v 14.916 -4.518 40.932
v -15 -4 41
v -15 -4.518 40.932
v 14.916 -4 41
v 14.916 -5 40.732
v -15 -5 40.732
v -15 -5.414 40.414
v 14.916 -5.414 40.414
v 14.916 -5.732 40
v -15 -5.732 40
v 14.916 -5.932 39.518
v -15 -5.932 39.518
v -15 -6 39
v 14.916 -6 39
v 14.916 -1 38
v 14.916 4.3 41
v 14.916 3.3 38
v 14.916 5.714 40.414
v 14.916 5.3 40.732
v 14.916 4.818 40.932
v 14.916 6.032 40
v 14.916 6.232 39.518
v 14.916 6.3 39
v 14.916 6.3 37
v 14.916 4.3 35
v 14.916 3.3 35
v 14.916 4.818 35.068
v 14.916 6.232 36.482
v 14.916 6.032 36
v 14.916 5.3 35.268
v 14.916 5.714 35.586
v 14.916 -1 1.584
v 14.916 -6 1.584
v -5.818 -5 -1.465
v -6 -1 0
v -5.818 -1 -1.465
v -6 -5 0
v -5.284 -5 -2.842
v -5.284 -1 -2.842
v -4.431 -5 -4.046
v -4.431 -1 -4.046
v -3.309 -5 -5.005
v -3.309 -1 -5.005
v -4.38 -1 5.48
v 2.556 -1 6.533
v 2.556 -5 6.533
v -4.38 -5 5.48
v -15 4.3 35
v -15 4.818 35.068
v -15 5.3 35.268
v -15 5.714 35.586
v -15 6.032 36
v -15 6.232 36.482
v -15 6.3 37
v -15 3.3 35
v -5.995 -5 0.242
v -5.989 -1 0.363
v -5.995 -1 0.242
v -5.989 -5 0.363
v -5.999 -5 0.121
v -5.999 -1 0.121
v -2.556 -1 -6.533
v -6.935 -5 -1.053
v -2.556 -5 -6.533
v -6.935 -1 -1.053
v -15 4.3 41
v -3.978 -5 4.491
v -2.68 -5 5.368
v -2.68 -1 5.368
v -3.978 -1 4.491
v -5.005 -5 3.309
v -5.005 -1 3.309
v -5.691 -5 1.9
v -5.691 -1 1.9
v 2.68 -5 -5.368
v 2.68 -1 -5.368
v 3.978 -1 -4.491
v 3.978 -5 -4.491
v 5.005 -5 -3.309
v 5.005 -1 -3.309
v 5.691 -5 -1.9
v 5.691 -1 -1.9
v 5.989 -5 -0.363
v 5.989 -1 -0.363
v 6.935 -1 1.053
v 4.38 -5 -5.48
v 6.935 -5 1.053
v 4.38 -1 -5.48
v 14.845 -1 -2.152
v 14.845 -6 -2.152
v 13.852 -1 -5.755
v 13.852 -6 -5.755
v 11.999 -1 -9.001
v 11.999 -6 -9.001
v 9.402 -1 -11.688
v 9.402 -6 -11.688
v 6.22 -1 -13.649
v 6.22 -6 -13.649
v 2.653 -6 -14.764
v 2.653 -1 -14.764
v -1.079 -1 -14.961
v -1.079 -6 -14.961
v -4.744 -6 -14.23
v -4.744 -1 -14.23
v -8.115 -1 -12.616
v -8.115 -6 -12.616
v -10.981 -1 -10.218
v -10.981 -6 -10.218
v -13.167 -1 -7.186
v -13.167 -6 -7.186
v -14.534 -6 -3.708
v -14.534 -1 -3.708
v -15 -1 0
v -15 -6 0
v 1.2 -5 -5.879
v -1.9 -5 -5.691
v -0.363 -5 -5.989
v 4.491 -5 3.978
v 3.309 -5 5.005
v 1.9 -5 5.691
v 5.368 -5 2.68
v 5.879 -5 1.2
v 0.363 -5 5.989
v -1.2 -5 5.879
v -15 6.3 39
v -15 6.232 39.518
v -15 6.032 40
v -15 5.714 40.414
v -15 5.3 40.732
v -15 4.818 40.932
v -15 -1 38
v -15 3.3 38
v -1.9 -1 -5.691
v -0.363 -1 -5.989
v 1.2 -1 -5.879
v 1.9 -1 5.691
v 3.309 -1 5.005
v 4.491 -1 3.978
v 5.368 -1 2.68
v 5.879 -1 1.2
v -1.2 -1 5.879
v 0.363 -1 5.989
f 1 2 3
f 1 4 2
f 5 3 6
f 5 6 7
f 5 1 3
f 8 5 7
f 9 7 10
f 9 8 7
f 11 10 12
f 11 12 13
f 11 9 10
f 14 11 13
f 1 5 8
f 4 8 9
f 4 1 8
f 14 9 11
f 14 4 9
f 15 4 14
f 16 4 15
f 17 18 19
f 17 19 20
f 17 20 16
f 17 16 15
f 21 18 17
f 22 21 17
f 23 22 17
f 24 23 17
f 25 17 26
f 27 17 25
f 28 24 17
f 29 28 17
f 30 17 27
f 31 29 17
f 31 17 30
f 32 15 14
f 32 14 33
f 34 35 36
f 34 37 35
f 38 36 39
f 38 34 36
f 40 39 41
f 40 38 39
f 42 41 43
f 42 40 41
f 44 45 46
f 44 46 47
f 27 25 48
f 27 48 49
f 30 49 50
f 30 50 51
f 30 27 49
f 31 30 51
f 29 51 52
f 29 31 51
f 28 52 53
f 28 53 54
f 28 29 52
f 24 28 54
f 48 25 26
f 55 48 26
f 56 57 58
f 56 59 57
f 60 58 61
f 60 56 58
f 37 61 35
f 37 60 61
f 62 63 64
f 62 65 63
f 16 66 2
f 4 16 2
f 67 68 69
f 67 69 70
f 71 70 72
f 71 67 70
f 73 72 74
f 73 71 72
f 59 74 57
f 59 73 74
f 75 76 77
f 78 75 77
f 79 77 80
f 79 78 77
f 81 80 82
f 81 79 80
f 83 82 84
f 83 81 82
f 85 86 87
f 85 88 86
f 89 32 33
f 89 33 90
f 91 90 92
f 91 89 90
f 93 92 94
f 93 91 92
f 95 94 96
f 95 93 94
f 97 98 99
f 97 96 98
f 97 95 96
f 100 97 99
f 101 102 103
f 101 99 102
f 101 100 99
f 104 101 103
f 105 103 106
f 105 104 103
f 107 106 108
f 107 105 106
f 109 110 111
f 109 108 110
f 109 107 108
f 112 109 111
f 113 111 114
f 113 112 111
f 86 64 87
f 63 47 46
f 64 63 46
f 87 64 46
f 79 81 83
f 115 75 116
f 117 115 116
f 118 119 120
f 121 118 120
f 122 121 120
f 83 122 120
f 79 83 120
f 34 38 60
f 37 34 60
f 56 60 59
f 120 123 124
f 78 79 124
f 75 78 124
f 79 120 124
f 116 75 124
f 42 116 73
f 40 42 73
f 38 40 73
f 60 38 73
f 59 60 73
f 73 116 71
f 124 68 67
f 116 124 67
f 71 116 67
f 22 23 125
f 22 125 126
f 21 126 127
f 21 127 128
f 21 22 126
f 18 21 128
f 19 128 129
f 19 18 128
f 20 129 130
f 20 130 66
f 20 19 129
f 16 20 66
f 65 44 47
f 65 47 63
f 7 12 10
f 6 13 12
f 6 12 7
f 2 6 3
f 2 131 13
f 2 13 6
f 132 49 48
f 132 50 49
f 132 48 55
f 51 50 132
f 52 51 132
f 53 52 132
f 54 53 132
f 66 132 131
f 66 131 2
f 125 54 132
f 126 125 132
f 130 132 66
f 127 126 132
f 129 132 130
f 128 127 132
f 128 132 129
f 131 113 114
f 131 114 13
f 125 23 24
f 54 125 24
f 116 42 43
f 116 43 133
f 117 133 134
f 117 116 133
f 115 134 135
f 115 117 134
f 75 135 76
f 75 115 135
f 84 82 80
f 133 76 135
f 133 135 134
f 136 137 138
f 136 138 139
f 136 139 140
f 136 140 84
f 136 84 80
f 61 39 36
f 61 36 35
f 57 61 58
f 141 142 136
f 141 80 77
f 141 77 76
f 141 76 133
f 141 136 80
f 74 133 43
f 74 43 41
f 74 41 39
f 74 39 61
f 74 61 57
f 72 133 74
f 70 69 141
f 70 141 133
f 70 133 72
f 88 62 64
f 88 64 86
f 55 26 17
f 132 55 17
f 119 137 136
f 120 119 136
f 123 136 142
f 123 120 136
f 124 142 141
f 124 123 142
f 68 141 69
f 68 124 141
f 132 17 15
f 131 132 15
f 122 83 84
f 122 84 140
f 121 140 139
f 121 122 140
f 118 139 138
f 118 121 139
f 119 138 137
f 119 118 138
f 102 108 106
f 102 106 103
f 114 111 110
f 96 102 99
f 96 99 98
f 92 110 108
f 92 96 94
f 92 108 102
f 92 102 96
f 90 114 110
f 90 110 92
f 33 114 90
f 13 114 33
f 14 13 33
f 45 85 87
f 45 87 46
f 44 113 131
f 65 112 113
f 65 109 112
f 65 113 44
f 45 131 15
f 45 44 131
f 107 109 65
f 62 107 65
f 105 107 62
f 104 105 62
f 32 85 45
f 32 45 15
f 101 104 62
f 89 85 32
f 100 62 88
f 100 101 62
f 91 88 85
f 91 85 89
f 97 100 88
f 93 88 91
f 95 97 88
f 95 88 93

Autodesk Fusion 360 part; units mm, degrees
sketch "Boceto1" plane through (0, 0, 0) normal (0, 1, 0) x (1, 0, 0)
  circle A0 centre (0, 0) radius 11
  circle A1 centre (0, 0) radius 12
  circle A2 centre (0, 0) radius 15
  line L0 (0, 0) -> (0, -0.3305)
  dimension "d1" = 22
  dimension "d2" = 1
  dimension "d3" = 30
extrude "Extruir1" add sketch "Boceto1" against normal blind 1 contours A2 makes body 1
sketch "Boceto2" plane through (0, -1, 0) normal (0, -1, 0) x (1, 0, 0)
  circle A0 centre (0, 0) radius 12
  circle A1 centre (0, 0) radius 15
  circle A2 centre (0, 0) radius 6.075
  line L0 (-4.3795, 5.4797) -> (-6.9353, -1.0529)
  line L1 (-6.9353, -1.0529) -> (-2.5558, -6.5326)
  line L2 (-2.5558, -6.5326) -> (4.3795, -5.4797)
  line L3 (4.3795, -5.4797) -> (6.9353, 1.0529)
  line L4 (6.9353, 1.0529) -> (2.5558, 6.5326)
  line L5 (2.5558, 6.5326) -> (-4.3795, 5.4797)
  dimension "d6" = 12.15
extrude "Extruir2" add sketch "Boceto2" along normal blind 5 contours A0 | A1 bodies 1
sketch "Boceto3" plane through (0, -6, 0) normal (0, -1, 0) x (1, 0, 0)
  circle A0 centre (0, 0) radius 15
  line L0 (-4.3795, 5.4797) -> (2.5558, 6.5326)
  line L1 (2.5558, 6.5326) -> (6.9353, 1.0529)
  line L2 (6.9353, 1.0529) -> (4.3795, -5.4797)
  line L3 (4.3795, -5.4797) -> (-2.5558, -6.5326)
  line L4 (-2.5558, -6.5326) -> (-6.9353, -1.0529)
  line L5 (-6.9353, -1.0529) -> (-4.3795, 5.4797)
extrude "Extruir3" add sketch "Boceto3" against normal blind 1 contours L0 L1 L2 L3 L4 L5 bodies 1
sketch "Boceto4" plane through (0, -5, 0) normal (0, 1, 0) x (-1, 0, 0)
  circle A0 centre (0, 0) radius 6
  line L0 (-0.4187, 6.9155) -> (-6.1984, 3.0951)
  line L1 (-6.1984, 3.0951) -> (-5.7797, -3.8204)
  line L2 (-5.7797, -3.8204) -> (0.4187, -6.9155)
  line L3 (0.4187, -6.9155) -> (6.1984, -3.0951)
  line L4 (6.1984, -3.0951) -> (5.7797, 3.8204)
  line L5 (5.7797, 3.8204) -> (-0.4187, 6.9155)
  line L6 (2.5558, -6.5326) -> (6.9353, -1.0529)
  line L7 (6.9353, -1.0529) -> (4.3795, 5.4797)
  line L8 (4.3795, 5.4797) -> (-2.5558, 6.5326)
  line L9 (-2.5558, 6.5326) -> (-6.9353, 1.0529)
  line L10 (-6.9353, 1.0529) -> (-4.3795, -5.4797)
  line L11 (-4.3795, -5.4797) -> (2.5558, -6.5326)
  dimension "d11" = 12
extrude "Extruir4" add sketch "Boceto4" along normal blind 4 separate body contours A0 makes body 2
copy_body "Cuerpo - > Comp.1" bodies 1 removing the originals makes body 3 in component "Tapa Rodamiento"
copy_body "Cuerpo - > Comp.2" bodies 2 removing the originals makes body 4 in component "Imán 12x4mm"
extrude "Extruir1'" cut 1 faces at (13.8995, 0, 1.3414) along direction (0, -1, 0) up to surface (1 mm away) on bodies 3 bodies 3 in component "Tapa Rodamiento"
sketch "Boceto5" plane through (0, -1, 0) normal (0, 1, 0) x (-1, 0, 0)
  line L0 (-2.5558, 6.5326) -> (4.3795, 5.4797)
  line L1 (4.3795, 5.4797) -> (6.9353, -1.0529)
  line L2 (6.9353, -1.0529) -> (2.5558, -6.5326)
  line L3 (2.5558, -6.5326) -> (-4.3795, -5.4797)
  line L4 (-4.3795, -5.4797) -> (-6.9353, 1.0529)
  line L5 (-6.9353, 1.0529) -> (-2.5558, 6.5326)
  line L6 (0, 0) -> (-14.9161, 0)
  line L7 (0, 0) -> (0, 38)
  line L8 (-14.9161, 0) -> (15, 0)
  line L9 (15, 0) -> (15, 38)
  line L10 (15, 38) -> (-14.9161, 38)
  line L11 (-14.9161, 38) -> (-14.9161, 0)
  circle A0 centre (0, 0) radius 15
  dimension "d18" = 38
extrude "Extruir2'" add sketch "Boceto5" against normal blind 5 contours L7 L10 L11 A0 | L7 L9 L10 A0 bodies 3 in component "Tapa Rodamiento"
sketch "Boceto6" plane through (14.9161, 0, 0) normal (1, 0, 0) x (0, 1, 0)
  line L0 (-1, 1.5845) -> (-1, 38)
  line L1 (-1, 38) -> (-6, 38)
  line L2 (-6, 38) -> (-6, 1.5845)
  line L3 (-6, 1.5845) -> (-1, 1.5845)
  line L4 (-6, 38) -> (-1, 38)
  line L5 (-1, 38) -> (-1, 41)
  line L6 (-1, 41) -> (-4, 41)
  line L7 (-6, 39) -> (-6, 38)
  line L8 (-1, 41) -> (3.3, 41)
  line L9 (3.3, 41) -> (3.3, 38)
  line L10 (3.3, 38) -> (-1, 38)
  line L11 (-1, 38) -> (-1, 41)
  line L12 (3.3, 41) -> (4.3, 41)
  line L13 (6.3, 39) -> (6.3, 37)
  line L14 (4.3, 35) -> (3.3, 35)
  line L15 (3.3, 35) -> (3.3, 41)
  arc A0 (4.3, 35) -> (6.3, 37) centre (4.3, 37) ccw
  arc A1 (6.3, 39) -> (4.3, 41) centre (4.3, 39) ccw
  arc A2 (-4, 41) -> (-6, 39) centre (-4, 39) ccw
  point P0 (6.3, 41)
  dimension "d21" = 4.3
  dimension "d22" = 3
  dimension "d23" = 2
  dimension "d24" = 2
  dimension "d25" = 2
extrude "Extruir3'" add sketch "Boceto6" against normal up to surface (29.9161 mm away) contours L1 L4 L5 L6 L7 L11 A2 | L5 L8 L9 L10 L11 L15 | L9 L12 L13 L14 L15 A0 A1 bodies 3 in component "Tapa Rodamiento"
component "Tapa Rodamiento" placed x (1, 0, 0) y (0, 1, 0) z (0, 0, 1) at (0, 0, 0)
component "Imán 12x4mm" placed x (1, 0, 0) y (0, 1, 0) z (0, 0, 1) at (0, 0, 0)
